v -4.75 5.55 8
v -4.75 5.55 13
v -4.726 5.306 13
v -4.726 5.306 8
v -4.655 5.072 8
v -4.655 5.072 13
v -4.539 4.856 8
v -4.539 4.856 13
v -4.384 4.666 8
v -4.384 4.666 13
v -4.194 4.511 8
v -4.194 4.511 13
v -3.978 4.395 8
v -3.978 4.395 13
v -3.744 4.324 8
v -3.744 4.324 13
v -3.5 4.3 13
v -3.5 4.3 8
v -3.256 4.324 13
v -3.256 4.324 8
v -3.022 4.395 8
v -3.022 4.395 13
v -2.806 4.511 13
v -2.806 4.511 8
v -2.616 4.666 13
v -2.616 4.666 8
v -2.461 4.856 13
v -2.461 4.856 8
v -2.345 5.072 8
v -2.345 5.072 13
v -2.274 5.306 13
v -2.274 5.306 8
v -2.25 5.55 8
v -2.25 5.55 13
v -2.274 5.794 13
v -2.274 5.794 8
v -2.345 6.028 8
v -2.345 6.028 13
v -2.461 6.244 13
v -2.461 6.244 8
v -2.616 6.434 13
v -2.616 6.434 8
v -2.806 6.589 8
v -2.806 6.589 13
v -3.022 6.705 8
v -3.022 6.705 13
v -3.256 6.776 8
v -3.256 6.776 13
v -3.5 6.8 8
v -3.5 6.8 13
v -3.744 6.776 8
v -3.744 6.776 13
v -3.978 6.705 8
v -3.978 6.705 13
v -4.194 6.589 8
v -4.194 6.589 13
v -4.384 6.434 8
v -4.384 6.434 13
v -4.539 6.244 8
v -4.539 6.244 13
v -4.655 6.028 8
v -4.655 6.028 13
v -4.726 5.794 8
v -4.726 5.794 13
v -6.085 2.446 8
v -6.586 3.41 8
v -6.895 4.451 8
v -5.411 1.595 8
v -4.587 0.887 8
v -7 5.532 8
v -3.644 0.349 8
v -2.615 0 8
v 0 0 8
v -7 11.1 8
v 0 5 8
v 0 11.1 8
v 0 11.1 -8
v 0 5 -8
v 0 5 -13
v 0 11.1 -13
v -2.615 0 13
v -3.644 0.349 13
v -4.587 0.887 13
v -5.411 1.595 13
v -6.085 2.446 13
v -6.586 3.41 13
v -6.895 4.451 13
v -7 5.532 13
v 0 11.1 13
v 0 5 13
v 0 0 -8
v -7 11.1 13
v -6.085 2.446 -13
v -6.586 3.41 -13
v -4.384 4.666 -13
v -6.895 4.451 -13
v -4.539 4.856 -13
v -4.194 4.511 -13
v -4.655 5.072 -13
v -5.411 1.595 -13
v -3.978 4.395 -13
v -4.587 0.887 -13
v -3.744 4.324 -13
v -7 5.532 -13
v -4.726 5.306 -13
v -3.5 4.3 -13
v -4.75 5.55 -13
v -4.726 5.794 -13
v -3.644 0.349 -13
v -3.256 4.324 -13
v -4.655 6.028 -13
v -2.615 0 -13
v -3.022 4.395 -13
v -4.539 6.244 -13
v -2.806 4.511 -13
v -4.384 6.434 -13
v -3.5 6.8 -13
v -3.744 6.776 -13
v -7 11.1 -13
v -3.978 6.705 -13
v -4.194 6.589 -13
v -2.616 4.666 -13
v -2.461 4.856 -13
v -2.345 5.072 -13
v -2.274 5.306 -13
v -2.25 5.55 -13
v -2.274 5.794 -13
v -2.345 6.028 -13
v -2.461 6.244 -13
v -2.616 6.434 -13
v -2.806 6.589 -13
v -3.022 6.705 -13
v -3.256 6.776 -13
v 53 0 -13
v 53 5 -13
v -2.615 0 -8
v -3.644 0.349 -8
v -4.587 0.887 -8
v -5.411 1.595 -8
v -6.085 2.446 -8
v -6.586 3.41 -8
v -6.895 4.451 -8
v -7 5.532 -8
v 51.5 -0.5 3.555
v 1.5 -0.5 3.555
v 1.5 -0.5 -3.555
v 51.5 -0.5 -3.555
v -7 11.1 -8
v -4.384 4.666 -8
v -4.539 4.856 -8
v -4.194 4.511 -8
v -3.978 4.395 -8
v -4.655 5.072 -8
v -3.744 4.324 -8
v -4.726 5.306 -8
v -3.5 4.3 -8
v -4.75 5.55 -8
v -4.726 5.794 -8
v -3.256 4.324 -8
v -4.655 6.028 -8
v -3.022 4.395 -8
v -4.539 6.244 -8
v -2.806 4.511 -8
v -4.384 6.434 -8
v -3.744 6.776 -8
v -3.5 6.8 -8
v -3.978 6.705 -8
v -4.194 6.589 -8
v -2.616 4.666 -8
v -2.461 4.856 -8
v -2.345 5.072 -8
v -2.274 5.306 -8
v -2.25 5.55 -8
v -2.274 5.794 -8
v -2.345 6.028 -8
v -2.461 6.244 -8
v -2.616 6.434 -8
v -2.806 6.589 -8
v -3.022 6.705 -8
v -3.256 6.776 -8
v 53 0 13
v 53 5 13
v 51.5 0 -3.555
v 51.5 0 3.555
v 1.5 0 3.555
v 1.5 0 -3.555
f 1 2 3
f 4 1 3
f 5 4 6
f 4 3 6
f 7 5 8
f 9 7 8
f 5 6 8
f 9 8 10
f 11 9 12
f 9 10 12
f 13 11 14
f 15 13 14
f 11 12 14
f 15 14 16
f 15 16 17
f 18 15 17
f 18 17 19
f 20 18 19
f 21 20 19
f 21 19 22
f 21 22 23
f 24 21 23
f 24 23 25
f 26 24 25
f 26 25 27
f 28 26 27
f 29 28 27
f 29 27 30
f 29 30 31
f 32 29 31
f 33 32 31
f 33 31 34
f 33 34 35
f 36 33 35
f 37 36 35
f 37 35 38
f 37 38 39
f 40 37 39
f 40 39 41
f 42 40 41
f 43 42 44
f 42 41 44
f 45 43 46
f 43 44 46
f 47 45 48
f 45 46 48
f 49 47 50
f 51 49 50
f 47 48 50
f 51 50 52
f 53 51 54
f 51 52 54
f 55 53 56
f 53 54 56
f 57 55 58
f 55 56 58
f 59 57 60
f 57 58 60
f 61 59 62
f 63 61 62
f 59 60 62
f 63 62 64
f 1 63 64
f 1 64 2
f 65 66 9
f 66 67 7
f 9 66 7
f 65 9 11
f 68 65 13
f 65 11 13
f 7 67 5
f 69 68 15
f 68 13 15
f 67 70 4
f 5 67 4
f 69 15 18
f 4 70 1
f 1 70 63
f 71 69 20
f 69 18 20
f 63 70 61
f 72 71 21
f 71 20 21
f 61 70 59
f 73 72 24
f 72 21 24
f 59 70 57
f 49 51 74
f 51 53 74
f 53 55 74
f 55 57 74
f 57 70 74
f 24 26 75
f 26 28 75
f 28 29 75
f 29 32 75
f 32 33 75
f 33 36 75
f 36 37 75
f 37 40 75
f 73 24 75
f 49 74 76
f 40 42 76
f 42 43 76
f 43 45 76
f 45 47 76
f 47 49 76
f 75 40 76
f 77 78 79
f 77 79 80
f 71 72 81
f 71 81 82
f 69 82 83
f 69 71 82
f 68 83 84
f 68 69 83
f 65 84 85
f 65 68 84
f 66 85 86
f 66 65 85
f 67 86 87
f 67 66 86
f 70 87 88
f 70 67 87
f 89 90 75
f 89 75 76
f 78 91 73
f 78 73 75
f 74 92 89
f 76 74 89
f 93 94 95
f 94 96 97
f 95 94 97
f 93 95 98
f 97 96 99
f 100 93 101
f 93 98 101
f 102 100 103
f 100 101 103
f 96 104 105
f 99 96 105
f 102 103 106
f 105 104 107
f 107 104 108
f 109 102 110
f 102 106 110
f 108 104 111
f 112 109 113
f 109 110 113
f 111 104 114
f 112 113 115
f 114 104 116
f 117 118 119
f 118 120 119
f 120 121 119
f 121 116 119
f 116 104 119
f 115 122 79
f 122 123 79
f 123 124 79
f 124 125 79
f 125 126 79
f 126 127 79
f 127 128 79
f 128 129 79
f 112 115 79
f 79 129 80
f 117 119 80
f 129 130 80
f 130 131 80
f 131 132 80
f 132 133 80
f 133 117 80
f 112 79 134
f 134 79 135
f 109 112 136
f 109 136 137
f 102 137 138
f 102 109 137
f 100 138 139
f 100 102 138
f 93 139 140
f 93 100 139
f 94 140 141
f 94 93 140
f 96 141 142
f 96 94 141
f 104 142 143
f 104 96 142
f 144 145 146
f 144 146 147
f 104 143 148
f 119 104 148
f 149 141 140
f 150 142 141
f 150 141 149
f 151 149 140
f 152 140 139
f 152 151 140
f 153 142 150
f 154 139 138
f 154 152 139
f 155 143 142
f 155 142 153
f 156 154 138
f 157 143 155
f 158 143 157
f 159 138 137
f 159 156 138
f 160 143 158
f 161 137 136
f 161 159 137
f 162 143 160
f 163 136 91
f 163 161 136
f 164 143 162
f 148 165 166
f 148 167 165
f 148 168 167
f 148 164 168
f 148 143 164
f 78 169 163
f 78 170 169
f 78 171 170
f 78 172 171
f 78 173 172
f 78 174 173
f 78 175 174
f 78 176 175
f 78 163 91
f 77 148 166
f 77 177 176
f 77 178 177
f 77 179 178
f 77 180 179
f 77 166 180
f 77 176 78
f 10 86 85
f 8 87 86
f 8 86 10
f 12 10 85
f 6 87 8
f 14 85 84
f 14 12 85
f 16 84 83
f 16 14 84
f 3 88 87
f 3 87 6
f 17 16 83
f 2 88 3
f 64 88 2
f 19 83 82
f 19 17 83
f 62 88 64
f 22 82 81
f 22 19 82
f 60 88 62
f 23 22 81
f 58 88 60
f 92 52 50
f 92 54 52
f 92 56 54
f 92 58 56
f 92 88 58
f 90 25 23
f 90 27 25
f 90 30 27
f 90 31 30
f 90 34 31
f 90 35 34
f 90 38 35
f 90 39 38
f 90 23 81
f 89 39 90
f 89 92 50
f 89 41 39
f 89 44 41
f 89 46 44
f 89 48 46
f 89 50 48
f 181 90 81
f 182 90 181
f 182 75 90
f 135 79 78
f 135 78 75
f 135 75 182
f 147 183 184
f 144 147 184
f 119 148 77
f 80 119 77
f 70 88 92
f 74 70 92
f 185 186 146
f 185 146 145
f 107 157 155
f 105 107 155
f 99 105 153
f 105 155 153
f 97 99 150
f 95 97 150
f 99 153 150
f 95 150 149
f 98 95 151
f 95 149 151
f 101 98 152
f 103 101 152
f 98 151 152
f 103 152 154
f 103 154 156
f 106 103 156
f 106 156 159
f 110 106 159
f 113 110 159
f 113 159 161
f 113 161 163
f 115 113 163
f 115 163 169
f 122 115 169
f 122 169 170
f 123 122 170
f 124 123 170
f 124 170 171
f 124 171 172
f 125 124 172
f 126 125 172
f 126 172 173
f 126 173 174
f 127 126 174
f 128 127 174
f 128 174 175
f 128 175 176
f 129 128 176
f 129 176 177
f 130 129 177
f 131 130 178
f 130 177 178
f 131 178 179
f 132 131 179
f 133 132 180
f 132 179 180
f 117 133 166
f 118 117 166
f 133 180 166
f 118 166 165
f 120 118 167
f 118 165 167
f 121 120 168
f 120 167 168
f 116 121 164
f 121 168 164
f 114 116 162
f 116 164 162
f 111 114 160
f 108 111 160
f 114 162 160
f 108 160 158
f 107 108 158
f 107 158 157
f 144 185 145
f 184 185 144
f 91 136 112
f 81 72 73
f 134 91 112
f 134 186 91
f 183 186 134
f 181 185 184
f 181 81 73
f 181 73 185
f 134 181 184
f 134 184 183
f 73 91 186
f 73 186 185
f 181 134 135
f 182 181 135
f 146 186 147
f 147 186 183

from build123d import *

# Parameters (mm, degrees)
BOSS_EXTRUDE1_DEPTH      = 13
BOSS_EXTRUDE1_DEPTH_BACK = 13
SKETCH1_W                = 53
SKETCH1_H                = 5
SKETCH2_W                = 7
SKETCH2_H                = 11.1
BOSS_EXTRUDE2_DEPTH      = 26
CUT_EXTRUDE1_DEPTH       = 8
CUT_EXTRUDE1_DEPTH_BACK  = 8
SKETCH3_W                = 7
SKETCH3_H                = 11.1
CUT_EXTRUDE3_START       = -26.000001
CUT_EXTRUDE3_DEPTH       = 26.000002
CUT_EXTRUDE5_REACH       = 62.068
SKETCH6_R                = 1.25
SKETCH7_W                = 50
SKETCH7_H                = 7.11
BOSS_EXTRUDE3_DEPTH      = 0.5


with BuildPart() as part:
    # Sketch1 → Boss-Extrude1 (new, two sides: drawn at the far end of the back side and taken through both)
    with BuildSketch(Plane.XY.offset(-BOSS_EXTRUDE1_DEPTH_BACK)):
        with Locations((26.5, 2.5)):
            Rectangle(SKETCH1_W, SKETCH1_H)
    extrude(amount=BOSS_EXTRUDE1_DEPTH + BOSS_EXTRUDE1_DEPTH_BACK)

    # Sketch2 → Boss-Extrude2 (add)
    with BuildSketch(Plane.XY.offset(13)):
        with Locations((-3.5, 5.55)):
            Rectangle(SKETCH2_W, SKETCH2_H)
    extrude(amount=-BOSS_EXTRUDE2_DEPTH)

    # Sketch3 → Cut-Extrude1 (cut, two sides: drawn at the far end of the back side and taken through both)
    with BuildSketch(Plane.XY.offset(-CUT_EXTRUDE1_DEPTH_BACK)):
        with Locations((-3.5, 5.55)):
            Rectangle(SKETCH3_W, SKETCH3_H)
    extrude(amount=CUT_EXTRUDE1_DEPTH + CUT_EXTRUDE1_DEPTH_BACK, mode=Mode.SUBTRACT)

    # Sketch5 → Cut-Extrude3 (cut)
    with BuildSketch(Plane.XY.offset(13).offset(CUT_EXTRUDE3_START)):
        with BuildLine():
            Line((-7, 0), (-2.615264285, 0))
            ThreePointArc((-2.615264285, 0), (-5.774039172, 2.011497403), (-7, 5.55))
            Line((-7, 5.55), (-7, 0))
        make_face()
    extrude(amount=CUT_EXTRUDE3_DEPTH, mode=Mode.SUBTRACT)

    # Cut-Extrude5: up to this face of the body (flat: up to its plane)
    cut_extrude5_end = Plane(part.part.faces().sort_by_distance((20.170778463, 3.227224149, -13))[0])
    # Sketch6 → Cut-Extrude5 (cut, up to the picked face)
    with BuildSketch(Plane.XY.offset(13), mode=Mode.PRIVATE) as cut_extrude5_sk1:
        with Locations(Location((-3.5, 5.55, 0), (0, 0, 180))):
            Circle(SKETCH6_R)
    cut_extrude5_tool1 = split(extrude(cut_extrude5_sk1.sketch, amount=-CUT_EXTRUDE5_REACH, mode=Mode.PRIVATE), bisect_by=cut_extrude5_end, keep=Keep.BOTH, mode=Mode.PRIVATE)
    add(cut_extrude5_tool1.solids().sort_by(Axis((-3.5, 5.55, 13), (0, 0, -1)))[0], mode=Mode.SUBTRACT)

    # Sketch7 → Boss-Extrude3 (add)
    with BuildSketch(Plane.XZ):
        with Locations((26.5, 0)):
            Rectangle(SKETCH7_W, SKETCH7_H)
    extrude(amount=BOSS_EXTRUDE3_DEPTH)


solid = part.part
